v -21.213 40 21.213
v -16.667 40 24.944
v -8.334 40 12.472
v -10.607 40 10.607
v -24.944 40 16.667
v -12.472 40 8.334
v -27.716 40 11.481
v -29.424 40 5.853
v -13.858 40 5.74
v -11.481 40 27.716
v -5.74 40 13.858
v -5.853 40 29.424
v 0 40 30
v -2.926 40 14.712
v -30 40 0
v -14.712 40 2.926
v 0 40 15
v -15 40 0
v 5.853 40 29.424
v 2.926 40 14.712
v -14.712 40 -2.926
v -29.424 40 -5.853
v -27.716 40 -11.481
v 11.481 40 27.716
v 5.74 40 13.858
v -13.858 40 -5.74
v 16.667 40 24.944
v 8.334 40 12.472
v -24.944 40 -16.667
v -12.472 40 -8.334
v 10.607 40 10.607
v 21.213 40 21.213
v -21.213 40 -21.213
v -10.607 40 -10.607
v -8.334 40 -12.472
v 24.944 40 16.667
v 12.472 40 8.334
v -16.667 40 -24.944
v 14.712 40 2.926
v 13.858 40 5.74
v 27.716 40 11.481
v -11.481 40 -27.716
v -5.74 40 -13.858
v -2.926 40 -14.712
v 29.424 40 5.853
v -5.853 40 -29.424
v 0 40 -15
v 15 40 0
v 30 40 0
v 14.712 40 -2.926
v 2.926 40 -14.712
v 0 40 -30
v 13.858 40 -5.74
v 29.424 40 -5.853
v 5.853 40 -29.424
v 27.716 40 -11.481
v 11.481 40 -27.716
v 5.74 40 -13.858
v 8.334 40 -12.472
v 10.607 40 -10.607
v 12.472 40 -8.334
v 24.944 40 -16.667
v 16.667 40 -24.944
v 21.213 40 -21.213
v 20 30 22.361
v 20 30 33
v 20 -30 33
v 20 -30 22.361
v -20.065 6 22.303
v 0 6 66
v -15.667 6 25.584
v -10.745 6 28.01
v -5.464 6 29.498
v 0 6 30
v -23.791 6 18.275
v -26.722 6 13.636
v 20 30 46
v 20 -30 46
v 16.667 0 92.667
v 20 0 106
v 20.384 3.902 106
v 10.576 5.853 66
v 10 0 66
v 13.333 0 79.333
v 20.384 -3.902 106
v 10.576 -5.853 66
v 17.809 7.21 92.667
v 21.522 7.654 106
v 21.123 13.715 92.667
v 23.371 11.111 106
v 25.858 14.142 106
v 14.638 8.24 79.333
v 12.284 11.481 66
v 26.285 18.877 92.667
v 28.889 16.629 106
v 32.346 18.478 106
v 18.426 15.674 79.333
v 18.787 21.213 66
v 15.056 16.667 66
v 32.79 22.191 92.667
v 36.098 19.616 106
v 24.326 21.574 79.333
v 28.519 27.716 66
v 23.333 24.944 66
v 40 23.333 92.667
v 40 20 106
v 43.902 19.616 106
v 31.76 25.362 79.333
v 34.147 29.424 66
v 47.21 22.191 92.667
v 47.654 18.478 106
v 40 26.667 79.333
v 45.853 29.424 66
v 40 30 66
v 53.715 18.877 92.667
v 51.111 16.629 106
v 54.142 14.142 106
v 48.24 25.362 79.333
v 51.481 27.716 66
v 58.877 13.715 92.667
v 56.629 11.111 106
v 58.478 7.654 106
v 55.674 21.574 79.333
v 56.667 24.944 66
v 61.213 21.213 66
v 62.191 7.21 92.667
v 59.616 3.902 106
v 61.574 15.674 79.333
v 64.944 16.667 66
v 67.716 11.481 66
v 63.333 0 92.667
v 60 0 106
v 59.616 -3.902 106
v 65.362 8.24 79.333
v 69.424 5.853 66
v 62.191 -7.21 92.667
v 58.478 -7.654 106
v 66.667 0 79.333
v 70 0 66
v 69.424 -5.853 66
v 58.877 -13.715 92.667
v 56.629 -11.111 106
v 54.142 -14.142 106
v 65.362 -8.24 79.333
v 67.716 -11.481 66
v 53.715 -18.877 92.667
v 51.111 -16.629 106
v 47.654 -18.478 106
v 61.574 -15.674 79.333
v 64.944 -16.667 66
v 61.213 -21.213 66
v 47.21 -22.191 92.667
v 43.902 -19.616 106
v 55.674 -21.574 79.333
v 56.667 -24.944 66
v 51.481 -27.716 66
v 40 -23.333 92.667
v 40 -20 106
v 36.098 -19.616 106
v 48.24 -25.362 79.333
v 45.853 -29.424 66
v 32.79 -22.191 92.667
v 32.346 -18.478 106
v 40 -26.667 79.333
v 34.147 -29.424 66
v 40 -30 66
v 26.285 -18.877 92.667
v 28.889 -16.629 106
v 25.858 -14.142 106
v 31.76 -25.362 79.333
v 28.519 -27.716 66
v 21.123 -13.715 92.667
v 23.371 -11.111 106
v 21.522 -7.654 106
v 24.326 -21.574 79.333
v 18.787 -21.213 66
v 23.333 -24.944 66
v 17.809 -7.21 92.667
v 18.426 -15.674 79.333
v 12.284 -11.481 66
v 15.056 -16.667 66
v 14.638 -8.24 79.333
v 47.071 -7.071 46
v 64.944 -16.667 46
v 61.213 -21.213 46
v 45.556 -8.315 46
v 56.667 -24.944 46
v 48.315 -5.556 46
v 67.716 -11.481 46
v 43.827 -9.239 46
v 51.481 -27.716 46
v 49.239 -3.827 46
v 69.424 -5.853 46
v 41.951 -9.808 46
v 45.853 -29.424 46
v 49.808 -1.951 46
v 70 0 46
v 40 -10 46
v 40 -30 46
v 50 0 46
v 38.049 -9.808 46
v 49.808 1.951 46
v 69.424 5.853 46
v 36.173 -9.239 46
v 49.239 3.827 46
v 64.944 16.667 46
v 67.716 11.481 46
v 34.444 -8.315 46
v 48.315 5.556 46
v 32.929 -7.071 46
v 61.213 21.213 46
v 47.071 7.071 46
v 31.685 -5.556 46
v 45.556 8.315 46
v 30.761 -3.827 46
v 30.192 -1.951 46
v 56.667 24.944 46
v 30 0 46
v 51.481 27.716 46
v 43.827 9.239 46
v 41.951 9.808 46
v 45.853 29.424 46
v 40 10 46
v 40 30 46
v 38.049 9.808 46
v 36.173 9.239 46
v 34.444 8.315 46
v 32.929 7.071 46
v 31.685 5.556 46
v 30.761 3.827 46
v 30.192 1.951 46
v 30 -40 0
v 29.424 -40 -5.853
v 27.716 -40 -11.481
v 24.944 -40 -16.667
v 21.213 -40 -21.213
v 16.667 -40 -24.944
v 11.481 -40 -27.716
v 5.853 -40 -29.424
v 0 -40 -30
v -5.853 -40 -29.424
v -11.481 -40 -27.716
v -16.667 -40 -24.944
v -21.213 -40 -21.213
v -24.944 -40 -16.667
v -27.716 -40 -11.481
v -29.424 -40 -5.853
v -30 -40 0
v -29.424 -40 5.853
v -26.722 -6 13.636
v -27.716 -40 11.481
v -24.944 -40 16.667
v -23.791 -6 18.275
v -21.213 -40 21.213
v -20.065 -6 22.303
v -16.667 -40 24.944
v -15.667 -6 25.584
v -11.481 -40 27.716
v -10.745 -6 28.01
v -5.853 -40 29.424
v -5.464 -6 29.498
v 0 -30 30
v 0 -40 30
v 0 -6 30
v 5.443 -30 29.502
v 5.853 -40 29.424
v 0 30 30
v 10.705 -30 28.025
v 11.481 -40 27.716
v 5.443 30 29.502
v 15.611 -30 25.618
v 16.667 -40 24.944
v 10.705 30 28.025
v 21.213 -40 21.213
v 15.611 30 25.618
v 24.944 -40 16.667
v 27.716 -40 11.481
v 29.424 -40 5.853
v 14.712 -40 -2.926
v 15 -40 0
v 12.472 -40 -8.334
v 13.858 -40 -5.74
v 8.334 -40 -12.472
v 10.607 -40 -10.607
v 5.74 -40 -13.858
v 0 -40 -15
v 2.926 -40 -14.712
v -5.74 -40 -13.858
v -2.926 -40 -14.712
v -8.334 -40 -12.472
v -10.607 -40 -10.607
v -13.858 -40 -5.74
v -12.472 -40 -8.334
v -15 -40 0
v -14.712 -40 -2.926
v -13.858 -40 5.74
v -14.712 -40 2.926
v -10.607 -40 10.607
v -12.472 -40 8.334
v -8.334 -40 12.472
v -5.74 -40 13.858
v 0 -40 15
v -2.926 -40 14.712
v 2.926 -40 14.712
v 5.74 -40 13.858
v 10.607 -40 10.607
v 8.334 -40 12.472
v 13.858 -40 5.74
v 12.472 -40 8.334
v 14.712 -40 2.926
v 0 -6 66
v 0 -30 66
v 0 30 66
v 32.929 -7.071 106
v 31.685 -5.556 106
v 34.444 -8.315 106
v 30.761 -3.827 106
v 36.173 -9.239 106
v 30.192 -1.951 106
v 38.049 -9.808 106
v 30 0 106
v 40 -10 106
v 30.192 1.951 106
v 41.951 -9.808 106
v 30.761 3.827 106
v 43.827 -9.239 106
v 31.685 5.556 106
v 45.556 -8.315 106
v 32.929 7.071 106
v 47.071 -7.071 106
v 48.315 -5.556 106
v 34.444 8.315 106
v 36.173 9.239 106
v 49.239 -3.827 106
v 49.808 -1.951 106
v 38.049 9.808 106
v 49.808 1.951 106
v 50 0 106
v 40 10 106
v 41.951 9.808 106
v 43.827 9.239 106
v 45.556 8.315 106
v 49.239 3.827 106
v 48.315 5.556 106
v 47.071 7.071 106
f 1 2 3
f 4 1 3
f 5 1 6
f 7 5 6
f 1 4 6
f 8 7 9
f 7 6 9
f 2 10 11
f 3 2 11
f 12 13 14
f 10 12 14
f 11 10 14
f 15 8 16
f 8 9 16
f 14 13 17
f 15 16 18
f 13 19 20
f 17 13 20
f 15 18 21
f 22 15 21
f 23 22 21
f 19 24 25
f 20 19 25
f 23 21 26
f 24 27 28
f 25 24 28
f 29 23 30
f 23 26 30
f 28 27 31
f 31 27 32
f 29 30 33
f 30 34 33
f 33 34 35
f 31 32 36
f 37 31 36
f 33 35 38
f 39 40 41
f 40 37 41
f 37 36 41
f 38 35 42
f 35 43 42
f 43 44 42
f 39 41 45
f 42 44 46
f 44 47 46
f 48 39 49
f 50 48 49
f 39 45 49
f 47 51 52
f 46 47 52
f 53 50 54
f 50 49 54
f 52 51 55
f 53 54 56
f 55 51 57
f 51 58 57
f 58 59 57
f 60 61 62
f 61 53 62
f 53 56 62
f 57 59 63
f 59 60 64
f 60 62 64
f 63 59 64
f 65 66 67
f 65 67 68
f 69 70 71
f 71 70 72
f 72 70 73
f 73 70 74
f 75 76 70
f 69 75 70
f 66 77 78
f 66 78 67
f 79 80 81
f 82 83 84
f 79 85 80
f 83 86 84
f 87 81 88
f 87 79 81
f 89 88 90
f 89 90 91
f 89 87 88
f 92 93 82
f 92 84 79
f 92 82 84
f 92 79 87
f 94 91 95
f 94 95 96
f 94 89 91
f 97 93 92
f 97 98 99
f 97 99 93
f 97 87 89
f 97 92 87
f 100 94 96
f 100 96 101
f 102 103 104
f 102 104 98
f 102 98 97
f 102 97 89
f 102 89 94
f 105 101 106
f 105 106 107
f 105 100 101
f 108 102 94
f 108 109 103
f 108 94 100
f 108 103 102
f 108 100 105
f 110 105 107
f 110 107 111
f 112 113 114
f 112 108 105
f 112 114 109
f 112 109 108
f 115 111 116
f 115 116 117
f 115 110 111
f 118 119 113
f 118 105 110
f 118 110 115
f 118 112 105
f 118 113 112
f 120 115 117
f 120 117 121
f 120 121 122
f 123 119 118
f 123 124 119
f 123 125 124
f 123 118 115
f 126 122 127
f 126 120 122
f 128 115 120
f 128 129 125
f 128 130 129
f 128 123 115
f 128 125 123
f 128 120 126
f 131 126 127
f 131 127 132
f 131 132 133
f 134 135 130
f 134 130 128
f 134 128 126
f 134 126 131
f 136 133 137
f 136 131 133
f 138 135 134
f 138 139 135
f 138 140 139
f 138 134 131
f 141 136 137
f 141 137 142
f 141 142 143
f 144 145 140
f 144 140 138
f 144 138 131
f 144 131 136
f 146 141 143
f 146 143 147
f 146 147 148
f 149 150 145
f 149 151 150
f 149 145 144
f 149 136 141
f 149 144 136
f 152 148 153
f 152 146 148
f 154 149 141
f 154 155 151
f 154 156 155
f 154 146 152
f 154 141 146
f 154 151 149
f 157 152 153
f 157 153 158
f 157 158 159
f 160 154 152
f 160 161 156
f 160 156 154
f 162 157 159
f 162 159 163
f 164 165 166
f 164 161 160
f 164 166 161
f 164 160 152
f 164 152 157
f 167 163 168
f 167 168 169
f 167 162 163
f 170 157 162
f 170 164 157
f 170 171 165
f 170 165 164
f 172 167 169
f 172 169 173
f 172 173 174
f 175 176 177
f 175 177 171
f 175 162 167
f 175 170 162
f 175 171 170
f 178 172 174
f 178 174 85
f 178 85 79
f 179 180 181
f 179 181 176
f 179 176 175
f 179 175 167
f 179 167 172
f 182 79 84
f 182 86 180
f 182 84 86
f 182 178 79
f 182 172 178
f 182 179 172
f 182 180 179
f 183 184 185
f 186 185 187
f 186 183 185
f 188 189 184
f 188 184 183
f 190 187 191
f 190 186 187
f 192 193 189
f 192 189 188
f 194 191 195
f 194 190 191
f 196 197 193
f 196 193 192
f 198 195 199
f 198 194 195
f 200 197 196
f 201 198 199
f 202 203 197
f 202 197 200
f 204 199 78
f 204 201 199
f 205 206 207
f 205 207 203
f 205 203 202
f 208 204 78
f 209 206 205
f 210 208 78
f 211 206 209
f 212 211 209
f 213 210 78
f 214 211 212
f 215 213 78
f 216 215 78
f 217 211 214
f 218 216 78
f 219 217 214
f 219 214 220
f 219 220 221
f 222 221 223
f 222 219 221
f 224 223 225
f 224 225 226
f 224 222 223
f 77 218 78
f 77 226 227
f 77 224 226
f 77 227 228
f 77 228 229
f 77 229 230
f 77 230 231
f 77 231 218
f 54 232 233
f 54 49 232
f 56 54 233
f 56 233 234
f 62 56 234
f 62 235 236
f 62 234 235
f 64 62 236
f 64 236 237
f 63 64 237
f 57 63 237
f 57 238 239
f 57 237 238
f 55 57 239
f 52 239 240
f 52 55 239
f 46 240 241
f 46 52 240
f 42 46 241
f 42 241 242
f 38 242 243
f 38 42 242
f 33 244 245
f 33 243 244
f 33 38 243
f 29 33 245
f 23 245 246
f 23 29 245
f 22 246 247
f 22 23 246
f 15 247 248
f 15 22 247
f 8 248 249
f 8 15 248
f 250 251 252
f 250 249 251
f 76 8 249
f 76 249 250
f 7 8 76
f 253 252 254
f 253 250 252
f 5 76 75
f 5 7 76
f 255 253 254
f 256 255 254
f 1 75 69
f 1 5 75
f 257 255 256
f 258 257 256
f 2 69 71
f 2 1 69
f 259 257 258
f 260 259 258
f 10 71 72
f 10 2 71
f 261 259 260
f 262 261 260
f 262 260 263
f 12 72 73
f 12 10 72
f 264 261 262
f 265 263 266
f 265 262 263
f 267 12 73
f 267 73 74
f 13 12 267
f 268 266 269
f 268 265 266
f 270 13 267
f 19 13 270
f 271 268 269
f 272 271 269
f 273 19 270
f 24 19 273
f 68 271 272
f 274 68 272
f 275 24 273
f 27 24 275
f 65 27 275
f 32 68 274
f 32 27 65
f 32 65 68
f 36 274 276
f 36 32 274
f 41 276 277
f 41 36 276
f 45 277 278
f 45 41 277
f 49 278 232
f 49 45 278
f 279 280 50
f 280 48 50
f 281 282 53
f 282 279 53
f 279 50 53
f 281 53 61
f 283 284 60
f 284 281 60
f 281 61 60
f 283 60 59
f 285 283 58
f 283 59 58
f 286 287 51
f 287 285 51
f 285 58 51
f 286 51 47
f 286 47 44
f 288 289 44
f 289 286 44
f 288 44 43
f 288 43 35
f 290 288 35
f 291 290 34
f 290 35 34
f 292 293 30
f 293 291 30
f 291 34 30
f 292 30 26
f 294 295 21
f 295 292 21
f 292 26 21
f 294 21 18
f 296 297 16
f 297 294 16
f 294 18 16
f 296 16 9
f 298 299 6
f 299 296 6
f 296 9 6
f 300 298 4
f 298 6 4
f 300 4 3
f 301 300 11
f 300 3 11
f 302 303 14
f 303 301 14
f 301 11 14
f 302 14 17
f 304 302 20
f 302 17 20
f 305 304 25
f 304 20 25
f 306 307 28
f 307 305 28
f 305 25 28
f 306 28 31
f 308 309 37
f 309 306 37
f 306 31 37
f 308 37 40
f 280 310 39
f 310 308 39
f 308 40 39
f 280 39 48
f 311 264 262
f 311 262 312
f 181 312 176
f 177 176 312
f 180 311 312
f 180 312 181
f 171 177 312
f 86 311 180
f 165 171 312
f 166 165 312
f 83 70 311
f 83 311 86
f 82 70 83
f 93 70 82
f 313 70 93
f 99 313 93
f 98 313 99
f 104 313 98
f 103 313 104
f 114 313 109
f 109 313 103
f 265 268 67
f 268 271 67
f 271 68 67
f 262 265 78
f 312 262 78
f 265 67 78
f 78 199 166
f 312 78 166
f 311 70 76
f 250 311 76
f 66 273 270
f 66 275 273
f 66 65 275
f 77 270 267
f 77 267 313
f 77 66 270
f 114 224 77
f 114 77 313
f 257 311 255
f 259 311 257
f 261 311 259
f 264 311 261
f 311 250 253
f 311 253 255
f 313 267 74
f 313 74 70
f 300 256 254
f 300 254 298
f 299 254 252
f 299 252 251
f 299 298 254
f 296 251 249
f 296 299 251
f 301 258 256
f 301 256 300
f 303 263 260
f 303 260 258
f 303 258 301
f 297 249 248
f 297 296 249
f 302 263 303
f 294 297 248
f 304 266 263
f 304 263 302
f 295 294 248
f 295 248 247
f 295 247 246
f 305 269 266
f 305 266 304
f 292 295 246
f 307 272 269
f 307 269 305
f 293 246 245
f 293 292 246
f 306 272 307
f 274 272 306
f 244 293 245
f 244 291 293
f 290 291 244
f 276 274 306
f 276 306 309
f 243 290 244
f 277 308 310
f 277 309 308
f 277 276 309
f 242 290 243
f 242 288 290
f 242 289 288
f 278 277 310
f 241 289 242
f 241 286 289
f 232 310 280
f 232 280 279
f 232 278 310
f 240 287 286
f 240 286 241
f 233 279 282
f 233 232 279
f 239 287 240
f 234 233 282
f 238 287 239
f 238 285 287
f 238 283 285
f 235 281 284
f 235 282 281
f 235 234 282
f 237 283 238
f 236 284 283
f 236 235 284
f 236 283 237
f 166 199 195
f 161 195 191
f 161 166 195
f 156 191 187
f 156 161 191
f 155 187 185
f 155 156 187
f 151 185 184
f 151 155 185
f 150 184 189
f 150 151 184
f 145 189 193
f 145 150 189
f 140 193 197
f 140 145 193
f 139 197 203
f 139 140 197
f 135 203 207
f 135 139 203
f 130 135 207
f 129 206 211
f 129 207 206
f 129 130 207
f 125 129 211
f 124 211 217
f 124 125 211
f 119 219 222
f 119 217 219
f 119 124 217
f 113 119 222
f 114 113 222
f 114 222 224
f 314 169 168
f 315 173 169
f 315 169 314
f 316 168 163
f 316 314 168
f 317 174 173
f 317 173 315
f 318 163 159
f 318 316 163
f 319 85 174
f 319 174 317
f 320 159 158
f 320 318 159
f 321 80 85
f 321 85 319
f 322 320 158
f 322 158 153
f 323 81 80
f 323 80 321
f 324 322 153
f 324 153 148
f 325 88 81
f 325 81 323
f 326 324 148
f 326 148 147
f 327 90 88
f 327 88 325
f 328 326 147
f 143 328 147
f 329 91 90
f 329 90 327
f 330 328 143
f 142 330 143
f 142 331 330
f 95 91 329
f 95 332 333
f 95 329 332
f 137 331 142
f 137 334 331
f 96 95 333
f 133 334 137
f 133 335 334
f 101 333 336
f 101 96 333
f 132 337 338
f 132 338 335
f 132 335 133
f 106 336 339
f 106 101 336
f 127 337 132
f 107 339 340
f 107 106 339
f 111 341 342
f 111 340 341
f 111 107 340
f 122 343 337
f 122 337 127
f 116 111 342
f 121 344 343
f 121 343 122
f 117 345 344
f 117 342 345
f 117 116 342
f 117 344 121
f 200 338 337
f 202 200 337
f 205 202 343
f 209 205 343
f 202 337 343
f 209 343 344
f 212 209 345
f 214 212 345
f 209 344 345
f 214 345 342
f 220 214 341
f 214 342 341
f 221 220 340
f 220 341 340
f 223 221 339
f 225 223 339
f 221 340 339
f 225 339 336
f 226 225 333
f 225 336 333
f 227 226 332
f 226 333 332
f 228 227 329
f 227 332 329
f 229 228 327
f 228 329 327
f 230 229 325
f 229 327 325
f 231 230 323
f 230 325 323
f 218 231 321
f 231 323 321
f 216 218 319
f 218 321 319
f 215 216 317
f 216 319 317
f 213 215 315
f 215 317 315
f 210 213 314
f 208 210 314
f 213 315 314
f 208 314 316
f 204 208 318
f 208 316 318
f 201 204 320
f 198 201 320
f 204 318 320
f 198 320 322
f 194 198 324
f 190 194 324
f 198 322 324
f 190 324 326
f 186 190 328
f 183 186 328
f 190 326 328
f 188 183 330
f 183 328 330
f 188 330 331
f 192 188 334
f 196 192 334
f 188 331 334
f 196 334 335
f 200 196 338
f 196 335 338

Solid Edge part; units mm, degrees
sketch "Sketch1" plane through (0, 0, 0) normal (0, -1, 0) x (1, 0, 0)
  circle A0 centre (0, 0) radius 30
  circle A1 centre (0, 0) radius 15
extrude "Protrusion1" add sketch "Sketch1" along normal mid plane 80
sketch "Sketch2" plane through (0, 0, 0) normal (0, -1, 0) x (1, 0, 0)
  line L0 (0, 66) -> (40, 66)
  line L1 (40, 66) -> (40, 46)
  line L2 (40, 46) -> (20, 46)
  line L3 (20, 46) -> (20, 33)
  line L4 (20, 33) -> (20, 22.3607)
  line L5 (0, 30) -> (0, 66)
  arc A0 (0, 30) -> (20, 22.3607) centre (0, 0) cw
extrude "ExtrudedProtrusion_2" add sketch "Sketch2" along normal mid plane 60
sketch "Sketch3" plane through (20, 0, 66) normal (0, 0, 1) x (1, 0, 0)
  line L0 (20, 30) -> (20, -30)
  arc A0 (20, 30) -> (20, -30) centre (20, 0) cw
extrude "Protrusion2" add sketch "Sketch3" against normal up to vertex (20 mm away)
sketch "Sketch4" plane through (20, 0, 66) normal (0, 0, 1) x (1, 0, 0)
  circle A0 centre (20, 0) radius 30
extrude "ExtrudedProtrusion_4" add sketch "Sketch4" along normal blind 40
sketch "Sketch5" plane through (40, 0, 106) normal (0, 0, 1) x (1, 0, 0)
  circle A0 centre (0, 0) radius 10
extrude "Cutout1" cut sketch "Sketch5" against normal up to vertex (60 mm away)
sketch "Sketch6" plane through (0, 0, 0) normal (0, -1, 0) x (1, 0, 0)
  line L0 (10, 66) -> (20, 106)
  line L1 (20, 106) -> (10, 106)
  line L2 (10, 106) -> (10, 66)
revolve "RevolvedCutout1" cut sketch "Sketch6" angle 360 about axis through (40, 0, 106) along (0, 0, -1)
sketch "Sketch7" plane through (0, 0, 0) normal (0, -1, 0) x (1, 0, 0)
  arc A0 (-26.7217, 13.6364) -> (0, 30) centre (0, 0) cw
  line L0 (0, 66) -> (-26.7217, 13.6364)
  line L1 (0, 66) -> (0, 30)
extrude "ExtrudedProtrusion_5" add sketch "Sketch7" along normal mid plane 12
